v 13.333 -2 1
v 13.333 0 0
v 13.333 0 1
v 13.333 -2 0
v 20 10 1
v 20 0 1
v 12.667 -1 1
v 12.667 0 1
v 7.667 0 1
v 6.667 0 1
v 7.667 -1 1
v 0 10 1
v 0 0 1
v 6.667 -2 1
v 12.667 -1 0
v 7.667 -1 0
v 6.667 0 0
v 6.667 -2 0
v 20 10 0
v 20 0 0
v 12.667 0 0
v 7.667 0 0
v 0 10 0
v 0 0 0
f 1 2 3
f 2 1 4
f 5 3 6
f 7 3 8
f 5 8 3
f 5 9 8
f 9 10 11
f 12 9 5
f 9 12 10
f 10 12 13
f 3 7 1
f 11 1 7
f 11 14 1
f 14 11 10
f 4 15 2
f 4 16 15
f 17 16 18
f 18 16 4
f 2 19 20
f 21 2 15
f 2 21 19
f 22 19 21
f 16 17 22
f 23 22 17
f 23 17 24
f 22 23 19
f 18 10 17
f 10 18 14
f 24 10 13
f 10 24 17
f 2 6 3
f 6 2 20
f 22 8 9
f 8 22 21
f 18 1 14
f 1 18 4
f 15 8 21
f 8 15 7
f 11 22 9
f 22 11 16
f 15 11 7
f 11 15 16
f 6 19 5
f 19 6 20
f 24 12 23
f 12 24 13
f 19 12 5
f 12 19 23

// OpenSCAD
/**
 * inside-keyboard.scad is part of Paper Laptop.
 * It describes the inside panel mount for keyboard,
 * trackpad, and any other input surface.
 *
 * @author R. S. Doiel, <rsdoiel@gmail.com>
 * copyright (c) 2016 all rights reserved
 * Released under a BSD 2-clause license
 */
module insideKeyboard(length, width) {
    /* main surface for keyboard mounts */
    color([0,0,1]) cube([length, width, 1]); 
    /* handle extension */
    difference() {
        translate([length/3, (width/5)*-1, 0]) {
            color([0,1,0]) cube([length/3, width/5, 1]);
        }    
        translate([(length/3)*1.15, (width/10)*-1, 0]) {
            //color([1,0,0]) 
            cube([(length/3)*0.75, width/10, 1]);
        }
    }
}

insideKeyboard(20, 10);
